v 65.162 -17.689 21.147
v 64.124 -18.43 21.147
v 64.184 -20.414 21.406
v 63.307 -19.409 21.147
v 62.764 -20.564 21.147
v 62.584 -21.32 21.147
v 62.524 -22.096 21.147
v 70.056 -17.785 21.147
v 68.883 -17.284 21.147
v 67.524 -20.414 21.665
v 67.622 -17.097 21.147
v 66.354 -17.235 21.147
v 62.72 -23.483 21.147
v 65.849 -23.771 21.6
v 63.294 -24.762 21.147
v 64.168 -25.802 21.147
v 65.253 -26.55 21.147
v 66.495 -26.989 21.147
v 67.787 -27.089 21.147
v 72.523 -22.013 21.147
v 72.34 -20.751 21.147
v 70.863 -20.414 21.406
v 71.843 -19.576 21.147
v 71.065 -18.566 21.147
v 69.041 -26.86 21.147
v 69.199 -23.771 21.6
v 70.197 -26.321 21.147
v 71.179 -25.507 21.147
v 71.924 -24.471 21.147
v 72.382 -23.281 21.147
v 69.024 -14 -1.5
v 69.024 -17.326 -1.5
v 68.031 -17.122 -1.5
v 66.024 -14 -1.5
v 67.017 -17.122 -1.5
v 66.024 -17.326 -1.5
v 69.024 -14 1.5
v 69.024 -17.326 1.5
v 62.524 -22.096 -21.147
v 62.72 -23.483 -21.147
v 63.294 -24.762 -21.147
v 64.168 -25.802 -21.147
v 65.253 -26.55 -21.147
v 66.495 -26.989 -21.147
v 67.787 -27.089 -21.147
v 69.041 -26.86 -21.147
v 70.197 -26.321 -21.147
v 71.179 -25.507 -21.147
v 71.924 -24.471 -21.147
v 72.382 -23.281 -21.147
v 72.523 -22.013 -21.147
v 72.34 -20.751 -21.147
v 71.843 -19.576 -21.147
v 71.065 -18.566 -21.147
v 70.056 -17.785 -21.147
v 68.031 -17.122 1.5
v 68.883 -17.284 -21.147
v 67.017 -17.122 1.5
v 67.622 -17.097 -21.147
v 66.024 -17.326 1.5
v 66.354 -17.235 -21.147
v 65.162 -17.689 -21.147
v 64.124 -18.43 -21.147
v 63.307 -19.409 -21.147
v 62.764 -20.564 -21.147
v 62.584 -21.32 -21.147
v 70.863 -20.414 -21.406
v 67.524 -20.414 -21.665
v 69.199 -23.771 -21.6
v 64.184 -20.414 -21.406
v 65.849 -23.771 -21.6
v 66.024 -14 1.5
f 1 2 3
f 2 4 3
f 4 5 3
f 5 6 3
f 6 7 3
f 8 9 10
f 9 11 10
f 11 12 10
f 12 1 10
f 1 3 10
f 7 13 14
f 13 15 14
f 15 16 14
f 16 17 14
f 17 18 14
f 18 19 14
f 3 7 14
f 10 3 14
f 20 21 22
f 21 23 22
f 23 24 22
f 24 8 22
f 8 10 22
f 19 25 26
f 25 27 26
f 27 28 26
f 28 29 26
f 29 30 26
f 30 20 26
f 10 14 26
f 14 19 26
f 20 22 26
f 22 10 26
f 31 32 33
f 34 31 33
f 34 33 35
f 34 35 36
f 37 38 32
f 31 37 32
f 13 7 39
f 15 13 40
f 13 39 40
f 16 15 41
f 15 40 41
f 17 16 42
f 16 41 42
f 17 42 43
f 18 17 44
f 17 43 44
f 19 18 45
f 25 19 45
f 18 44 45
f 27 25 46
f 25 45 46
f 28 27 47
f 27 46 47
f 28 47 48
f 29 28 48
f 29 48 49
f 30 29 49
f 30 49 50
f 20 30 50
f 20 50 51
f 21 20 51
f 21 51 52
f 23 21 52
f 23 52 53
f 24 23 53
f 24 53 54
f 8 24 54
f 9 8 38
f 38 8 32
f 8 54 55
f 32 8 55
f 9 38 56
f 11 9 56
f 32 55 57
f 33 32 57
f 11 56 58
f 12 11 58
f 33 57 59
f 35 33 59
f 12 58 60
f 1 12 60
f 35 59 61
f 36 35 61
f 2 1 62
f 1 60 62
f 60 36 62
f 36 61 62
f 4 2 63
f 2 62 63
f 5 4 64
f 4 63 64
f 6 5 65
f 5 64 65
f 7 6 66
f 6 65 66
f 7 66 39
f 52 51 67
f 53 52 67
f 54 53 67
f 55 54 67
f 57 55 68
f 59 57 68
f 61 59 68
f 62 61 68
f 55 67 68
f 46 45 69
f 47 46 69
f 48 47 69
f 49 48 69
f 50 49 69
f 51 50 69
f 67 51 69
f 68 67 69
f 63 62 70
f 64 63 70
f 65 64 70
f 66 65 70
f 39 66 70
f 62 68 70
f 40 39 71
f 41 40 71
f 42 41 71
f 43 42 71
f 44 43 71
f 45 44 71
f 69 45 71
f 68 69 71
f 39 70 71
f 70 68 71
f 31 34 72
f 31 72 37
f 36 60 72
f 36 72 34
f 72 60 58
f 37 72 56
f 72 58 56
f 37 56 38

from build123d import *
from build123d.topology import SkipClean

# Parameters (mm, degrees)
BOSS_EXTRUDE1_DEPTH       = 2
CUT_EXTRUDE4_DEPTH        = 10
SKETCH6_W                 = 2
SKETCH6_H                 = 14.5
CUT_EXTRUDE5_DEPTH        = 10
SKETCH7_W                 = 12.5
SKETCH7_H                 = 12.5
BOSS_EXTRUDE2_DEPTH       = 2.5
SKETCH8_W                 = 2
SKETCH8_H                 = 2
BOSS_EXTRUDE3_DEPTH       = 41.5
CUT_EXTRUDE6_DEPTH        = 41.5
SKETCH10_W                = 2
SKETCH10_H                = 2
BOSS_EXTRUDE4_DEPTH       = 50.5
CUT_EXTRUDE7_DEPTH        = 50.5
SKETCH12_W                = 12.5
SKETCH12_H                = 12.5
BOSS_EXTRUDE5_DEPTH       = 2.5
CUT_EXTRUDE8_DEPTH        = 60.477411679
CUT_EXTRUDE8_DEPTH_BACK   = 2.5
SKETCH14_W                = 12.5
SKETCH14_H                = 12.5
BOSS_EXTRUDE6_DEPTH       = 2.5
SKETCH15_W                = 2
SKETCH15_H                = 2
BOSS_EXTRUDE7_DEPTH       = 39.5
SKETCH16_W                = 12.5
SKETCH16_H                = 12.5
BOSS_EXTRUDE8_DEPTH       = 2.5
SKETCH17_W                = 2
SKETCH17_H                = 12.5
BOSS_EXTRUDE9_DEPTH       = 2.5
SKETCH18_W                = 2
SKETCH18_H                = 12.5
CUT_EXTRUDE9_DEPTH        = 13.5
SKETCH19_W                = 2
SKETCH19_H                = 2
BOSS_EXTRUDE10_DEPTH      = 7.5
CUT_EXTRUDE11_DEPTH       = 33.5
CUT_EXTRUDE12_DEPTH       = 33.5
SKETCH22_W                = 2
SKETCH22_H                = 2
BOSS_EXTRUDE11_DEPTH      = 35.5
BOSS_EXTRUDE13_DEPTH      = 4
BOSS_EXTRUDE14_DEPTH      = 4
BOSS_EXTRUDE15_DEPTH      = 4
BOSS_EXTRUDE16_DEPTH      = 4
SKETCH28_R                = 4.5
SKETCH28_W                = 2
SKETCH28_H                = 2
BOSS_EXTRUDE17_DEPTH      = 57
SKETCH29_R                = 4.5
SKETCH29_W                = 2
SKETCH29_H                = 2
BOSS_EXTRUDE18_DEPTH      = 57
SKETCH30_R                = 4.5
SKETCH30_W                = 2
SKETCH30_H                = 2
BOSS_EXTRUDE19_DEPTH      = 57
SKETCH31_R                = 4.5
SKETCH31_W                = 2
SKETCH31_H                = 2
BOSS_EXTRUDE20_DEPTH      = 57
SKETCH32_W                = 122.959633523
SKETCH32_H                = 42.81362782
CUT_EXTRUDE13_DEPTH       = 57
BOSS_EXTRUDE21_DEPTH      = 1
CUT_EXTRUDE14_DEPTH       = 8
CUT_EXTRUDE15_DEPTH       = 8
CUT_EXTRUDE16_DEPTH       = 8
CUT_EXTRUDE17_DEPTH       = 8
BOSS_EXTRUDE22_DEPTH      = 1
BOSS_EXTRUDE23_DEPTH      = 2
BOSS_EXTRUDE23_DEPTH_BACK = 2
BOSS_EXTRUDE24_DEPTH      = 4
BOSS_EXTRUDE25_DEPTH      = 12.5
CUT_EXTRUDE18_DEPTH       = 12.5
SKETCH43_W                = 16
SKETCH43_H                = 2
CUT_EXTRUDE19_DEPTH       = 8.5
SKETCH44_R                = 1.5
CUT_EXTRUDE20_DEPTH       = 8.5
SKETCH45_R                = 9
BOSS_EXTRUDE27_DEPTH      = 20
CUT_EXTRUDE23_START       = -30
SKETCH50_R                = 9
CUT_EXTRUDE23_DEPTH       = 65
CUT_EXTRUDE24_DEPTH       = 65
CUT_EXTRUDE24_DEPTH_BACK  = 65
SKETCH52_W                = 56.65762051
SKETCH52_H                = 44.736687233
CUT_EXTRUDE25_DEPTH       = 65
CUT_EXTRUDE25_DEPTH_BACK  = 65
CUT_EXTRUDE26_DEPTH       = 65
CUT_EXTRUDE26_DEPTH_BACK  = 68
SKETCH56_R                = 43.614088274
SKETCH56_R_2              = 5
SKETCH57_R                = 5
CUT_EXTRUDE27_DEPTH       = 65
CUT_EXTRUDE28_DEPTH       = 17
CUT_EXTRUDE28_DEPTH_BACK  = 38
SKETCH58_R                = 5
CUT_EXTRUDE29_DEPTH       = 38
CUT_EXTRUDE30_DEPTH       = 38
CUT_EXTRUDE30_DEPTH_BACK  = 38
CUT_EXTRUDE36_DEPTH       = 79
CUT_EXTRUDE36_DEPTH_BACK  = 38
BOSS_EXTRUDE28_START      = -20
SKETCH62_W                = 3
SKETCH62_H                = 3
BOSS_EXTRUDE28_DEPTH      = 6


with BuildPart() as part:
    # Sketch4 → Boss-Extrude1 (new body)
    with BuildSketch(Plane.XY):
        Polygon((-2, 0), (-9, 0), (-15.226290525, 65), (-17.226290525, 65), (-11, 0), (-18, 0), (-24.539432883, 50), (-26.539432883, 50), (-20, 0), (-26, 0), (-26, -2), (15, -2), (15, 0), (9, 0), (13.425952869, 55), (11.425952869, 55), (7, 0), (0, 0), (0, 65), (-2, 65), align=None)
    extrude(amount=BOSS_EXTRUDE1_DEPTH)

    # Sketch5 → Cut-Extrude4 (cut)
    with BuildSketch(Plane.XY.offset(2)):
        Polygon((9.37564634, 55.872220493), (11.411691477, 54.822777915), (13.398823363, 54.662869695), (21.924639112, 53.976781356), (22.692490212, 57.613912627), (5.524505056, 72.3940809), (-16.325209023, 68.104380376), (-29.665618302, 62.849218827), (-29.083331676, 48.976254453), (-26.450573674, 49.320589338), (-24.484209654, 49.577767448), (-21.099856707, 50.020402427), (-24.484209654, 55.686609511), (-20.205422124, 64.224167275), (-17.179736544, 64.513994928), (-15.197920791, 64.703831246), (-10.585008306, 65.145697912), (2.587624418, 67.202095486), align=None)
    extrude(amount=-CUT_EXTRUDE4_DEPTH, mode=Mode.SUBTRACT)

    # Sketch6 → Cut-Extrude5 (cut)
    with BuildSketch(Plane.XY.offset(2)):
        Polygon((-22.603788855, 35.200214888), (-24.484209654, 49.577767448), (-26.450573674, 49.320589338), (-24.570152875, 34.943036778), align=None)
        Polygon((-13.815307691, 50.26989966), (-15.197920791, 64.703831246), (-17.179736544, 64.513994928), (-15.797123444, 50.080063343), align=None)
        with Locations((-1, 57.75)):
            Rectangle(SKETCH6_W, SKETCH6_H)
        Polygon((13.398823363, 54.662869695), (11.411691477, 54.822777915), (10.248609178, 40.369500101), (12.235741065, 40.209591881), align=None)
    extrude(amount=-CUT_EXTRUDE5_DEPTH, mode=Mode.SUBTRACT)

    # Sketch7 → Boss-Extrude2 (add)
    with BuildSketch(Plane(origin=(0, 50.5, 0), x_dir=(1, 0, 0), z_dir=(0, 1, 0))):
        with Locations((-1, -1)):
            Rectangle(SKETCH7_W, SKETCH7_H)
    extrude(amount=BOSS_EXTRUDE2_DEPTH)

    # Sketch8 → Boss-Extrude3 (add)
    with BuildSketch(Plane(origin=(3.293647576, 40.929178869, 0), x_dir=(0.9967777802722212, -0.08021257230374512, 0), z_dir=(0.08021257230374512, 0.9967777802722212, 0))):
        with Locations((11.977444462, -1)):
            Rectangle(SKETCH8_W, SKETCH8_H)
    extrude(amount=-BOSS_EXTRUDE3_DEPTH)

    # Sketch9 → Cut-Extrude6 (cut)
    with BuildSketch(Plane.XY.offset(2)):
        Polygon((7, 0), (9, 0), (12.235741065, 40.209591881), (10.248609178, 40.369500101), align=None)
    extrude(amount=-CUT_EXTRUDE6_DEPTH, mode=Mode.SUBTRACT)

    # Sketch10 → Boss-Extrude4 (add)
    with BuildSketch(Plane(origin=(-4.897136804, 51.124163089, 0), x_dir=(0.995443557626006, 0.09535262755100443, 0), z_dir=(-0.09535262755100443, 0.995443557626006, 0))):
        with Locations((-13.958992019, -1)):
            Rectangle(SKETCH10_W, SKETCH10_H)
    extrude(amount=-BOSS_EXTRUDE4_DEPTH)

    # Sketch11 → Cut-Extrude7 (cut)
    with BuildSketch(Plane.XY.offset(2)):
        Polygon((-11, 0), (-9, 0), (-13.815307691, 50.26989966), (-15.797123444, 50.080063343), align=None)
    extrude(amount=-CUT_EXTRUDE7_DEPTH, mode=Mode.SUBTRACT)

    # Sketch12 → Boss-Extrude5 (add)
    with BuildSketch(Plane(origin=(3.293647576, 40.929178869, 0), x_dir=(0.9967777802722212, -0.08021257230374557, 0), z_dir=(0.08021257230374557, 0.9967777802722213, 0))):
        with Locations((11.977444462, -1)):
            Rectangle(SKETCH12_W, SKETCH12_H)
    extrude(amount=BOSS_EXTRUDE5_DEPTH)

    # Sketch13 → Cut-Extrude8 (cut, two sides: drawn at the far end of the back side and taken through both)
    with BuildSketch(Plane.XY.offset(2).offset(-CUT_EXTRUDE8_DEPTH_BACK)):
        Polygon((-17.606376667, 47.897602035), (-17.797081922, 49.88848915), (-19.787969037, 49.697783895), (-19.637893395, 48.131053798), (-19.615531264, 47.897602035), (-19.597263782, 47.70689678), align=None)
    extrude(amount=CUT_EXTRUDE8_DEPTH + CUT_EXTRUDE8_DEPTH_BACK, mode=Mode.SUBTRACT)

    # Sketch14 → Boss-Extrude6 (add)
    with BuildSketch(Plane(origin=(-4.706431548, 49.133275974, 0), x_dir=(0.995443557626006, 0.0953526275510043, 0), z_dir=(-0.0953526275510043, 0.995443557626006, 0))):
        with Locations((-13.958992019, -1)):
            Rectangle(SKETCH14_W, SKETCH14_H)
    extrude(amount=BOSS_EXTRUDE6_DEPTH)



with BuildPart() as body_2:
    # Sketch15 → Boss-Extrude7 (new body)
    with BuildSketch(Plane(origin=(-4.906512673, 37.514817884, 0), x_dir=(0.9915553489661718, 0.12968419308679568, 0), z_dir=(-0.12968419308679568, 0.9915553489661719, 0))):
        with Locations((-30.847996281, -1)):
            Rectangle(SKETCH15_W, SKETCH15_H)
    extrude(amount=-BOSS_EXTRUDE7_DEPTH)

    # Sketch16 → Boss-Extrude8 (add)
    with BuildSketch(Plane(origin=(-4.906512673, 37.514817884, 0), x_dir=(0.9915553489661718, 0.1296841930867958, 0), z_dir=(-0.1296841930867958, 0.9915553489661719, 0))):
        with Locations((-30.847996281, -1)):
            Rectangle(SKETCH16_W, SKETCH16_H)
    extrude(amount=BOSS_EXTRUDE8_DEPTH)

    # Sketch17 → Boss-Extrude9 (add)
    with BuildSketch(Plane(origin=(-5.230723156, 39.993706257, 0), x_dir=(0.9915553489661718, 0.12968419308679563, 0), z_dir=(-0.12968419308679563, 0.9915553489661718, 0))):
        with Locations((-23.597996281, -1)):
            Rectangle(SKETCH17_W, SKETCH17_H)
    extrude(amount=-BOSS_EXTRUDE9_DEPTH)

    # Sketch18 → Cut-Extrude9 (cut)
    with BuildSketch(Plane(origin=(-5.230723156, 39.993706257, 0), x_dir=(0.9915553489661718, 0.12968419308679563, 0), z_dir=(-0.12968419308679563, 0.9915553489661718, 0))):
        with Locations((-36.097996281, -1)):
            Rectangle(SKETCH18_W, SKETCH18_H)
    extrude(amount=-CUT_EXTRUDE9_DEPTH, mode=Mode.SUBTRACT)


with BuildPart() as part_1:
    add(part.part)

    add(body_2.part)  # Boss-Extrude10 merges body 2
    # Sketch19 → Boss-Extrude10 (add)
    with BuildSketch(Plane.ZY.offset(26)):
        with Locations((1, -1)):
            Rectangle(SKETCH19_W, SKETCH19_H)
    extrude(amount=BOSS_EXTRUDE10_DEPTH)

    # Sketch20 → Cut-Extrude11 (cut)
    with BuildSketch(Plane.XY.offset(2)):
        Polygon((-31.857654672, -2), (-29.840621531, -2), (-29.379927415, -5.522431713), (-31.363038113, -5.781800099), align=None)
        Polygon((-20, 0), (-18, 0), (-22.603788855, 35.200214888), (-24.570152875, 34.943036778), align=None)
    extrude(amount=-CUT_EXTRUDE11_DEPTH, mode=Mode.SUBTRACT)

    # Sketch21 → Cut-Extrude12 (cut)
    with BuildSketch(Plane.XY.offset(2)):
        Polygon((-36.48556374, 33.384636185), (-34.502453042, 33.644004571), (-30.102198846, 0), (-32.119231987, 0), align=None)
    extrude(amount=-CUT_EXTRUDE12_DEPTH, mode=Mode.SUBTRACT)


with BuildPart() as cut_extrude12_piece_1:
    # of the separate pieces the step leaves, piece 1, a body of its own (cut_extrude12_pieces)
    add(part_1.part.solids().sort_by_distance((-15.027463791, 0, 0))[0])



with BuildPart() as cut_extrude12_piece_2:
    # of the separate pieces the step leaves, piece 2, a body of its own (cut_extrude12_pieces)
    add(part_1.part.solids().sort_by_distance((-40.032329107, 35.44205093, -5.25))[0])


with BuildPart() as cut_extrude12_piece_1_1:
    add(cut_extrude12_piece_1.part)

    add(cut_extrude12_piece_2.part)  # Boss-Extrude11 merges Cut-Extrude12 piece 2
    # Sketch22 → Boss-Extrude11 (add)
    with BuildSketch(Plane(origin=(-4.906512673, 37.514817884, 0), x_dir=(-0.9915553489661718, -0.12968419308679563, 0), z_dir=(0.12968419308679563, -0.9915553489661718, 0))):
        with Locations((28.847996281, -1)):
            Rectangle(SKETCH22_W, SKETCH22_H)
    extrude(amount=BOSS_EXTRUDE11_DEPTH)

    # Sketch24 → Boss-Extrude13 (add)
    with BuildSketch(Plane(origin=(18.168711631, -1.462070207, 0), x_dir=(0, 0, -1), z_dir=(0.9967777802722213, -0.08021257230374557, 0))):
        with BuildLine():
            Line((5.25, 43.561488006), (5.25, 49.561488006))
            ThreePointArc((5.25, 49.561488006), (-1, 55.538239219), (-7.25, 49.561488006))
            Line((-7.25, 49.561488006), (-7.25, 43.561488006))
            Line((-7.25, 43.561488006), (5.25, 43.561488006))
        make_face()
    extrude(amount=-BOSS_EXTRUDE13_DEPTH)

    # Sketch25 → Boss-Extrude14 (add)
    with BuildSketch(Plane(origin=(5.25, 0, 0), x_dir=(0, 0, -1), z_dir=(1, 0, 0))):
        with BuildLine():
            Line((-7.25, 53), (5.25, 53))
            Line((5.25, 53), (5.25, 59.612068966))
            ThreePointArc((5.25, 59.612068966), (-1, 65), (-7.25, 59.612068966))
            Line((-7.25, 59.612068966), (-7.25, 53))
        make_face()
    extrude(amount=-BOSS_EXTRUDE14_DEPTH)

    # Sketch26 → Boss-Extrude15 (add)
    with BuildSketch(Plane(origin=(-7.673866441, -0.735072645, 0), x_dir=(0, 0, -1), z_dir=(0.995443557626006, 0.0953526275510043, 0))):
        with BuildLine():
            Line((-7.25, 51.858173648), (5.25, 51.858173648))
            Line((5.25, 51.858173648), (5.25, 58.470242613))
            ThreePointArc((5.25, 58.470242613), (-1, 63.858173648), (-7.25, 58.470242613))
            Line((-7.25, 58.470242613), (-7.25, 51.858173648))
        make_face()
    extrude(amount=-BOSS_EXTRUDE15_DEPTH)

    # Sketch27 → Boss-Extrude16 (add)
    with BuildSketch(Plane(origin=(-22.407164089, -2.930602913, 0), x_dir=(0, 0, -1), z_dir=(0.9915553489661718, 0.12968419308679563, 0))):
        with BuildLine():
            Line((-7.25, 40.334315476), (5.25, 40.334315476))
            Line((5.25, 40.334315476), (5.25, 46.946384441))
            ThreePointArc((5.25, 46.946384441), (-1, 52.334315476), (-7.25, 46.946384441))
            Line((-7.25, 46.946384441), (-7.25, 40.334315476))
        make_face()
    extrude(amount=-BOSS_EXTRUDE16_DEPTH)

    # Sketch28 → Boss-Extrude17 (add)
    with BuildSketch(Plane(origin=(0, 50.5, 0), x_dir=(-1, 0, 0), z_dir=(0, -1, 0))):
        with Locations((1, -1)):
            Circle(SKETCH28_R)
        with Locations((1, -1)):
            Rectangle(SKETCH28_W, SKETCH28_H, mode=Mode.SUBTRACT)
    extrude(amount=BOSS_EXTRUDE17_DEPTH)

    # Sketch29 → Boss-Extrude18 (add)
    with BuildSketch(Plane(origin=(-4.706431548, 49.133275974, 0), x_dir=(-0.995443557626006, -0.09535262755100447, 0), z_dir=(0.09535262755100449, -0.9954435576260061, 0))):
        with Locations((13.958992019, -1)):
            Circle(SKETCH29_R)
        with Locations((13.958992019, -1)):
            Rectangle(SKETCH29_W, SKETCH29_H, mode=Mode.SUBTRACT)
    extrude(amount=BOSS_EXTRUDE18_DEPTH)

    # Sketch30 → Boss-Extrude19 (add)
    with BuildSketch(Plane(origin=(-4.906512673, 37.514817884, 0), x_dir=(0.9915553489661718, 0.12968419308679563, 0), z_dir=(0.12968419308679563, -0.9915553489661718, 0))):
        with Locations((-28.847996281, 1)):
            Circle(SKETCH30_R)
        with Locations((-28.847996281, 1)):
            Rectangle(SKETCH30_W, SKETCH30_H, mode=Mode.SUBTRACT)
    extrude(amount=BOSS_EXTRUDE19_DEPTH)

    # Sketch31 → Boss-Extrude20 (add)
    with BuildSketch(Plane(origin=(3.293647576, 40.929178869, 0), x_dir=(-0.9967777802722212, 0.08021257230374572, 0), z_dir=(-0.0802125723037457, -0.9967777802722211, 0))):
        with Locations((-11.977444462, -1)):
            Circle(SKETCH31_R)
        with Locations((-11.977444462, -1)):
            Rectangle(SKETCH31_W, SKETCH31_H, mode=Mode.SUBTRACT)
    extrude(amount=BOSS_EXTRUDE20_DEPTH)

    # Sketch32 → Cut-Extrude13 (cut)
    with BuildSketch(Plane.XZ.offset(2)):
        with Locations((-20.029572383, 0.792189378)):
            Rectangle(SKETCH32_W, SKETCH32_H)
    extrude(amount=CUT_EXTRUDE13_DEPTH, mode=Mode.SUBTRACT)

    # Sketch33 → Boss-Extrude21 (add)
    with BuildSketch(Plane(origin=(0, -2, 0), x_dir=(-1, 0, 0), z_dir=(0, -1, 0))):
        with BuildLine():
            Line((-14.023148824, -9), (30.976851176, -9))
            ThreePointArc((30.976851176, -9), (34.512385082, -7.535533906), (35.976851176, -4))
            Line((35.976851176, -4), (35.976851176, 2))
            ThreePointArc((35.976851176, 2), (34.512385082, 5.535533906), (30.976851176, 7))
            Line((30.976851176, 7), (-14.023148824, 7))
            ThreePointArc((-14.023148824, 7), (-17.55868273, 5.535533906), (-19.023148824, 2))
            Line((-19.023148824, 2), (-19.023148824, -4))
            ThreePointArc((-19.023148824, -4), (-17.55868273, -7.535533906), (-14.023148824, -9))
        make_face()
    extrude(amount=BOSS_EXTRUDE21_DEPTH)

    # Sketch34 → Cut-Extrude14 (cut)
    with BuildSketch(Plane(origin=(-26.373385485, -3.449339685, 0), x_dir=(0, 0, 1), z_dir=(-0.9915553489661718, -0.12968419308679557, 0))):
        with BuildLine():
            ThreePointArc((1, 45.434315476), (2.060660172, 45.873655304), (2.5, 46.934315476))
            ThreePointArc((2.5, 46.934315476), (-0.060660172, 47.994975647), (1, 45.434315476))
        make_face()
    extrude(amount=-CUT_EXTRUDE14_DEPTH, mode=Mode.SUBTRACT)

    # Sketch35 → Cut-Extrude15 (cut)
    with BuildSketch(Plane(origin=(-11.655640671, -1.116483155, 0), x_dir=(0, 0, 1), z_dir=(-0.995443557626006, -0.09535262755100442, 0))):
        with BuildLine():
            ThreePointArc((1, 56.958173648), (2.060660172, 57.397513476), (2.5, 58.458173648))
            ThreePointArc((2.5, 58.458173648), (-0.060660172, 59.51883382), (1, 56.958173648))
        make_face()
    extrude(amount=-CUT_EXTRUDE15_DEPTH, mode=Mode.SUBTRACT)

    # Sketch36 → Cut-Extrude16 (cut)
    with BuildSketch(Plane.ZY.offset(-1.25)):
        with BuildLine():
            ThreePointArc((1, 58.1), (2.060660172, 58.539339828), (2.5, 59.6))
            ThreePointArc((2.5, 59.6), (-0.060660172, 60.660660172), (1, 58.1))
        make_face()
    extrude(amount=-CUT_EXTRUDE16_DEPTH, mode=Mode.SUBTRACT)

    # Sketch37 → Cut-Extrude17 (cut)
    with BuildSketch(Plane(origin=(14.18160051, -1.141219918, 0), x_dir=(0, 0, 1), z_dir=(-0.9967777802722212, 0.08021257230374561, 0))):
        with BuildLine():
            ThreePointArc((1, 48.661488006), (2.060660172, 49.100827834), (2.5, 50.161488006))
            ThreePointArc((2.5, 50.161488006), (-0.060660172, 51.222148178), (1, 48.661488006))
        make_face()
    extrude(amount=-CUT_EXTRUDE17_DEPTH, mode=Mode.SUBTRACT)

    # Sketch38 → Boss-Extrude22 (add)
    with BuildSketch(Plane(origin=(0, -3, 0), x_dir=(-1, 0, 0), z_dir=(0, -1, 0))):
        with BuildLine():
            ThreePointArc((-14.023148824, -9), (-17.55868273, -7.535533906), (-19.023148824, -4))
            Line((-19.023148824, -4), (-19.023148824, -11))
            ThreePointArc((-19.023148824, -11), (-17.55868273, -14.535533906), (-14.023148824, -16))
            Line((-14.023148824, -16), (30.976851176, -16))
            ThreePointArc((30.976851176, -16), (34.512385082, -14.535533906), (35.976851176, -11))
            Line((35.976851176, -11), (35.976851176, -4))
            ThreePointArc((35.976851176, -4), (34.512385082, -7.535533906), (30.976851176, -9))
            Line((30.976851176, -9), (-14.023148824, -9))
        make_face()
    extrude(amount=-BOSS_EXTRUDE22_DEPTH)



with BuildPart() as body_2_2:
    # Sketch39 → Boss-Extrude23 (new, two sides: drawn at the far end of the back side and taken through both)
    with BuildSketch(Plane(origin=(0, -2, 0), x_dir=(1, 0, 0), z_dir=(0, 1, 0)).offset(-BOSS_EXTRUDE23_DEPTH_BACK)):
        Polygon((-30.0929677, -18.954951288), (-34.512385082, -14.535533906), (-38.931802465, -10.116116524), (-47.770637229, -18.954951288), (-39.165158063, -28.027141652), align=None)
    extrude(amount=BOSS_EXTRUDE23_DEPTH + BOSS_EXTRUDE23_DEPTH_BACK)


with BuildPart() as cut_extrude12_piece_1_2:
    add(cut_extrude12_piece_1_1.part)

    add(body_2_2.part)  # Boss-Extrude24 merges body 2 2
    # Sketch40 → Boss-Extrude24 (add)
    with BuildSketch(Plane(origin=(0, 0, 0), x_dir=(1, 0, 0), z_dir=(0, 1, 0))):
        Polygon((-35.976851176, -8.888761514), (-38.931802465, -10.116116524), (-30.0929677, -18.954951288), (-28.86561269, -16), align=None)
        Polygon((-39.165158063, -28.027141652), (-47.770637229, -18.954951288), (-50.245510964, -21.429825023), (-41.406676199, -30.268659787), align=None)
    extrude(amount=-BOSS_EXTRUDE24_DEPTH)

    # Sketch41 → Boss-Extrude25 (add)
    with BuildSketch(Plane(origin=(0, -2, 0), x_dir=(1, 0, 0), z_dir=(0, 1, 0))):
        Polygon((-44.235103323, -27.440232663), (-41.406676199, -30.268659787), (-32.567841434, -21.429825023), (-35.396268559, -18.601397898), align=None)
    extrude(amount=BOSS_EXTRUDE25_DEPTH)

    # Sketch42 → Cut-Extrude18 (cut)
    with BuildSketch(Plane(origin=(-8.39743533, 0, -8.39743533), x_dir=(-0.7071067811865478, 0, 0.7071067811865472), z_dir=(-0.7071067811865472, 0, -0.7071067811865478))):
        with BuildLine():
            ThreePointArc((50.68211612, 5.25), (44.43211612, 10.5), (38.18211612, 5.25))
            ThreePointArc((38.18211612, 5.25), (44.43211612, 16.808543829), (50.68211612, 5.25))
        make_face()
    extrude(amount=-CUT_EXTRUDE18_DEPTH, mode=Mode.SUBTRACT)

    # Sketch43 → Cut-Extrude19 (cut)
    with BuildSketch(Plane(origin=(-14.407842971, 0, -14.407842971), x_dir=(-0.7071067811865479, 0, 0.7071067811865472), z_dir=(-0.7071067811865472, 0, -0.7071067811865479))):
        with Locations((42.68211612, -1)):
            Rectangle(SKETCH43_W, SKETCH43_H)
    extrude(amount=-CUT_EXTRUDE19_DEPTH, mode=Mode.SUBTRACT)

    # Sketch44 → Cut-Extrude20 (cut)
    with BuildSketch(Plane(origin=(-8.39743533, 0, -8.39743533), x_dir=(-0.7071067811865478, 0, 0.7071067811865472), z_dir=(-0.7071067811865472, 0, -0.7071067811865478))):
        with Locations((44.43211612, 4.6)):
            Circle(SKETCH44_R)
    extrude(amount=-CUT_EXTRUDE20_DEPTH, mode=Mode.SUBTRACT)

    # Sketch45 → Boss-Extrude27 (add)
    with BuildSketch(Plane(origin=(0, -3, 0), x_dir=(-1, 0, 0), z_dir=(0, -1, 0))):
        with Locations((8.476851176, -4.5)):
            Circle(SKETCH45_R)
    extrude(amount=BOSS_EXTRUDE27_DEPTH)


with BuildPart() as body_2_3:
    # Sketch46 → Revolve1 (revolve)
    with BuildSketch(Plane.XY):
        with BuildLine():
            Line((-8.476851176, -45.826430986), (-8.476851176, -89.289265837))
            ThreePointArc((-8.476851176, -89.289265837), (13.254566249, -67.557848412), (-8.476851176, -45.826430986))
        make_face()
    revolve(axis=Axis((-8.476851176, -45.826430986, 0), (0, -1, 0)))

    # Sketch50 → Cut-Extrude23 (cut)
    with BuildSketch(Plane(origin=(0, 0, 0), x_dir=(1, 0, 0), z_dir=(0, 1, 0)).offset(CUT_EXTRUDE23_START)):
        with Locations((-8.476851176, 0)):
            Circle(SKETCH50_R)
    extrude(amount=-CUT_EXTRUDE23_DEPTH, mode=Mode.SUBTRACT)

    # Sketch52 → Cut-Extrude24 (cut, two sides: drawn at the far end of the back side and taken through both)
    with BuildSketch(Plane(origin=(0, 0, 0), x_dir=(0, 0, -1), z_dir=(1, 0, 0)).offset(-CUT_EXTRUDE24_DEPTH_BACK)):
        with Locations((0, -67.557848412)):
            Rectangle(SKETCH52_W, SKETCH52_H)
        Polygon((-10.161758641, -47.777694132), (0, -47.777694132), (10.161758641, -47.777694132), (10.161758641, -87.338002691), (0, -87.338002691), (-10.161758641, -87.338002691), align=None, mode=Mode.SUBTRACT)
    extrude(amount=CUT_EXTRUDE24_DEPTH + CUT_EXTRUDE24_DEPTH_BACK, mode=Mode.SUBTRACT)

    # Sketch57 → Cut-Extrude27 (cut)
    with BuildSketch(Plane.XY.offset(10.161758641)):
        with Locations((-8.476851176, -67.557848412)):
            Circle(SKETCH57_R)
    extrude(amount=-CUT_EXTRUDE27_DEPTH, mode=Mode.SUBTRACT)

    # Sketch59 → Cut-Extrude29 (cut)
    with BuildSketch(Plane.XY.offset(10.161758641)):
        Polygon((-2.226851176, -67.557848412), (-2.226851176, -73.807848412), (-14.726851176, -73.807848412), (-14.726851176, -67.557848412), (-40.012372079, -67.557848412), (-40.012372079, -94.995810902), (23.058669727, -94.995810902), (23.058669727, -67.557848412), align=None)
    extrude(amount=-CUT_EXTRUDE29_DEPTH, mode=Mode.SUBTRACT)


with BuildPart() as body_3:
    # Sketch53 → Revolve2 (revolve)
    with BuildSketch(Plane(origin=(0, 0, 0), x_dir=(1, 0, 0), z_dir=(0, 1, 0))):
        with BuildLine():
            Line((-8.800357803, -28.92805964), (-8.800357803, -72.38805964))
            ThreePointArc((-8.800357803, -72.38805964), (-30.530357803, -50.65805964), (-8.800357803, -28.92805964))
        make_face()
    revolve(axis=Axis((-8.800357803, 0, 28.92805964), (0, 0, 1)))

    # Sketch54 → Cut-Extrude25 (cut, two sides: drawn at the far end of the back side and taken through both)
    with SkipClean():  # the faces are left unmerged after this step: merging them gives an invalid solid
        with BuildSketch(Plane(origin=(0, 0, 0), x_dir=(1, 0, 0), z_dir=(0, 1, 0)).offset(-CUT_EXTRUDE25_DEPTH_BACK)):
            with BuildLine():
                ThreePointArc((-18.960357803, -69.866581186), (-14.034463591, -71.748271507), (-8.800357803, -72.38805964))
                ThreePointArc((-8.800357803, -72.38805964), (-3.566252015, -71.748271507), (1.359642197, -69.866581186))
                Line((1.359642197, -69.866581186), (1.359642197, -31.449538093))
                ThreePointArc((1.359642197, -31.449538093), (-3.566252019, -29.567847772), (-8.80035781, -28.92805964))
                ThreePointArc((-8.80035781, -28.92805964), (-14.034463594, -29.567847773), (-18.960357803, -31.449538093))
                Line((-18.960357803, -31.449538093), (-18.960357803, -69.866581186))
            make_face()
        extrude(amount=CUT_EXTRUDE25_DEPTH + CUT_EXTRUDE25_DEPTH_BACK, mode=Mode.SUBTRACT)


with BuildPart() as cut_extrude25_piece_1:
    # of the separate pieces the step leaves, piece 1, a body of its own (cut_extrude25_pieces)
    add(body_3.part.solids().sort_by_distance((1.359642197, -2.431e-06, 31.449538093))[0])


with BuildPart() as cut_extrude25_piece_2:
    # of the separate pieces the step leaves, piece 2, a body of its own (cut_extrude25_pieces)
    add(body_3.part.solids().sort_by_distance((-18.960357803, 0, 69.866581186))[0])


with BuildPart() as body_5:
    # Sketch55 → Revolve3 (revolve)
    with BuildSketch(Plane.XY):
        with BuildLine():
            Line((67.523973483, -43.825779011), (67.523973483, -0.365779011))
            ThreePointArc((67.523973483, -0.365779011), (45.793973483, -22.095779011), (67.523973483, -43.825779011))
        make_face()
    revolve(axis=Axis((67.523973483, -43.825779011, 0), (0, 1, 0)))

    # Sketch56 → Cut-Extrude26 (cut, two sides: drawn at the far end of the back side and taken through both)
    with BuildSketch(Plane.XY.offset(-CUT_EXTRUDE26_DEPTH_BACK)):
        with Locations((67.523973483, -22.095779011)):
            Circle(SKETCH56_R)
        with Locations((67.523973483, -22.095779011)):
            Circle(SKETCH56_R_2, mode=Mode.SUBTRACT)
    extrude(amount=CUT_EXTRUDE26_DEPTH + CUT_EXTRUDE26_DEPTH_BACK, mode=Mode.SUBTRACT)

    # Sketch62 → Boss-Extrude28 (add)
    with BuildSketch(Plane(origin=(0, 0, 0), x_dir=(1, 0, 0), z_dir=(0, 1, 0)).offset(BOSS_EXTRUDE28_START)):
        with Locations((67.523973483, 0)):
            Rectangle(SKETCH62_W, SKETCH62_H)
    extrude(amount=BOSS_EXTRUDE28_DEPTH)


with BuildPart() as cut_extrude28_tool:
    # Sketch58 → Cut-Extrude28 (new, two sides: drawn at the far end of the back side and taken through both)
    with SkipClean():  # the faces are left unmerged after this step: merging them gives an invalid solid
        with BuildSketch(Plane(origin=(0, 0, 0), x_dir=(0, 0, -1), z_dir=(1, 0, 0)).offset(-CUT_EXTRUDE28_DEPTH_BACK)):
            with Locations((-50.65805964, 0)):
                Circle(SKETCH58_R)
        extrude(amount=CUT_EXTRUDE28_DEPTH + CUT_EXTRUDE28_DEPTH_BACK)


with BuildPart() as cut_extrude25_piece_1_1:
    with SkipClean():  # the faces are left unmerged after this step: merging them gives an invalid solid
        add(cut_extrude25_piece_1.part)

        # Cut-Extrude28: cut by cut_extrude28_tool
        add(cut_extrude28_tool.part, mode=Mode.SUBTRACT)


with BuildPart() as cut_extrude25_piece_2_1:
    with SkipClean():  # the faces are left unmerged after this step: merging them gives an invalid solid
        add(cut_extrude25_piece_2.part)

        # Cut-Extrude28: cut by cut_extrude28_tool
        add(cut_extrude28_tool.part, mode=Mode.SUBTRACT)


with BuildPart() as cut_extrude30_tool:
    # Sketch60 → Cut-Extrude30 (new, two sides: drawn at the far end of the back side and taken through both)
    with BuildSketch(Plane(origin=(-18.960357803, 0, 0), x_dir=(0, 0, -1), z_dir=(1, 0, 0)).offset(-CUT_EXTRUDE30_DEPTH_BACK)):
        Polygon((-26.705466863, -24.826098639), (-26.705466863, 0), (-44.40805964, 0), (-44.40805964, -6.25), (-56.90805964, -6.25), (-56.90805964, 0), (-74.610652417, 0), (-74.610652417, -24.826098639), align=None)
    extrude(amount=CUT_EXTRUDE30_DEPTH + CUT_EXTRUDE30_DEPTH_BACK)


with BuildPart() as cut_extrude12_piece_1_3:
    add(cut_extrude12_piece_1_2.part)

    # Cut-Extrude30: cut by cut_extrude30_tool
    add(cut_extrude30_tool.part, mode=Mode.SUBTRACT)


with BuildPart() as cut_extrude25_piece_1_2:
    add(cut_extrude25_piece_1_1.part)

    # Cut-Extrude30: cut by cut_extrude30_tool
    add(cut_extrude30_tool.part, mode=Mode.SUBTRACT)


with BuildPart() as cut_extrude25_piece_2_2:
    add(cut_extrude25_piece_2_1.part)

    # Cut-Extrude30: cut by cut_extrude30_tool
    add(cut_extrude30_tool.part, mode=Mode.SUBTRACT)


with BuildPart() as cut_extrude36_tool:
    # Sketch61 → Cut-Extrude36 (new, two sides: drawn at the far end of the back side and taken through both)
    with BuildSketch(Plane.XY.offset(-CUT_EXTRUDE36_DEPTH_BACK)):
        Polygon((36.856010868, 69.554774267), (-56.142006645, 69.554774267), (-56.142006645, -105.644942173), (31.122269385, -105.644942173), (31.122269385, -34.697128753), (36.856010868, -34.697128753), align=None)
    extrude(amount=CUT_EXTRUDE36_DEPTH + CUT_EXTRUDE36_DEPTH_BACK)


with BuildPart() as cut_extrude12_piece_1_4:
    add(cut_extrude12_piece_1_3.part)

    # Cut-Extrude36: cut by cut_extrude36_tool
    add(cut_extrude36_tool.part, mode=Mode.SUBTRACT)


with BuildPart() as body_2_3_1:
    add(body_2_3.part)

    # Cut-Extrude36: cut by cut_extrude36_tool
    add(cut_extrude36_tool.part, mode=Mode.SUBTRACT)


with BuildPart() as cut_extrude25_piece_1_3:
    add(cut_extrude25_piece_1_2.part)

    # Cut-Extrude36: cut by cut_extrude36_tool
    add(cut_extrude36_tool.part, mode=Mode.SUBTRACT)


with BuildPart() as cut_extrude25_piece_2_3:
    add(cut_extrude25_piece_2_2.part)

    # Cut-Extrude36: cut by cut_extrude36_tool
    add(cut_extrude36_tool.part, mode=Mode.SUBTRACT)


solid = body_5.part
